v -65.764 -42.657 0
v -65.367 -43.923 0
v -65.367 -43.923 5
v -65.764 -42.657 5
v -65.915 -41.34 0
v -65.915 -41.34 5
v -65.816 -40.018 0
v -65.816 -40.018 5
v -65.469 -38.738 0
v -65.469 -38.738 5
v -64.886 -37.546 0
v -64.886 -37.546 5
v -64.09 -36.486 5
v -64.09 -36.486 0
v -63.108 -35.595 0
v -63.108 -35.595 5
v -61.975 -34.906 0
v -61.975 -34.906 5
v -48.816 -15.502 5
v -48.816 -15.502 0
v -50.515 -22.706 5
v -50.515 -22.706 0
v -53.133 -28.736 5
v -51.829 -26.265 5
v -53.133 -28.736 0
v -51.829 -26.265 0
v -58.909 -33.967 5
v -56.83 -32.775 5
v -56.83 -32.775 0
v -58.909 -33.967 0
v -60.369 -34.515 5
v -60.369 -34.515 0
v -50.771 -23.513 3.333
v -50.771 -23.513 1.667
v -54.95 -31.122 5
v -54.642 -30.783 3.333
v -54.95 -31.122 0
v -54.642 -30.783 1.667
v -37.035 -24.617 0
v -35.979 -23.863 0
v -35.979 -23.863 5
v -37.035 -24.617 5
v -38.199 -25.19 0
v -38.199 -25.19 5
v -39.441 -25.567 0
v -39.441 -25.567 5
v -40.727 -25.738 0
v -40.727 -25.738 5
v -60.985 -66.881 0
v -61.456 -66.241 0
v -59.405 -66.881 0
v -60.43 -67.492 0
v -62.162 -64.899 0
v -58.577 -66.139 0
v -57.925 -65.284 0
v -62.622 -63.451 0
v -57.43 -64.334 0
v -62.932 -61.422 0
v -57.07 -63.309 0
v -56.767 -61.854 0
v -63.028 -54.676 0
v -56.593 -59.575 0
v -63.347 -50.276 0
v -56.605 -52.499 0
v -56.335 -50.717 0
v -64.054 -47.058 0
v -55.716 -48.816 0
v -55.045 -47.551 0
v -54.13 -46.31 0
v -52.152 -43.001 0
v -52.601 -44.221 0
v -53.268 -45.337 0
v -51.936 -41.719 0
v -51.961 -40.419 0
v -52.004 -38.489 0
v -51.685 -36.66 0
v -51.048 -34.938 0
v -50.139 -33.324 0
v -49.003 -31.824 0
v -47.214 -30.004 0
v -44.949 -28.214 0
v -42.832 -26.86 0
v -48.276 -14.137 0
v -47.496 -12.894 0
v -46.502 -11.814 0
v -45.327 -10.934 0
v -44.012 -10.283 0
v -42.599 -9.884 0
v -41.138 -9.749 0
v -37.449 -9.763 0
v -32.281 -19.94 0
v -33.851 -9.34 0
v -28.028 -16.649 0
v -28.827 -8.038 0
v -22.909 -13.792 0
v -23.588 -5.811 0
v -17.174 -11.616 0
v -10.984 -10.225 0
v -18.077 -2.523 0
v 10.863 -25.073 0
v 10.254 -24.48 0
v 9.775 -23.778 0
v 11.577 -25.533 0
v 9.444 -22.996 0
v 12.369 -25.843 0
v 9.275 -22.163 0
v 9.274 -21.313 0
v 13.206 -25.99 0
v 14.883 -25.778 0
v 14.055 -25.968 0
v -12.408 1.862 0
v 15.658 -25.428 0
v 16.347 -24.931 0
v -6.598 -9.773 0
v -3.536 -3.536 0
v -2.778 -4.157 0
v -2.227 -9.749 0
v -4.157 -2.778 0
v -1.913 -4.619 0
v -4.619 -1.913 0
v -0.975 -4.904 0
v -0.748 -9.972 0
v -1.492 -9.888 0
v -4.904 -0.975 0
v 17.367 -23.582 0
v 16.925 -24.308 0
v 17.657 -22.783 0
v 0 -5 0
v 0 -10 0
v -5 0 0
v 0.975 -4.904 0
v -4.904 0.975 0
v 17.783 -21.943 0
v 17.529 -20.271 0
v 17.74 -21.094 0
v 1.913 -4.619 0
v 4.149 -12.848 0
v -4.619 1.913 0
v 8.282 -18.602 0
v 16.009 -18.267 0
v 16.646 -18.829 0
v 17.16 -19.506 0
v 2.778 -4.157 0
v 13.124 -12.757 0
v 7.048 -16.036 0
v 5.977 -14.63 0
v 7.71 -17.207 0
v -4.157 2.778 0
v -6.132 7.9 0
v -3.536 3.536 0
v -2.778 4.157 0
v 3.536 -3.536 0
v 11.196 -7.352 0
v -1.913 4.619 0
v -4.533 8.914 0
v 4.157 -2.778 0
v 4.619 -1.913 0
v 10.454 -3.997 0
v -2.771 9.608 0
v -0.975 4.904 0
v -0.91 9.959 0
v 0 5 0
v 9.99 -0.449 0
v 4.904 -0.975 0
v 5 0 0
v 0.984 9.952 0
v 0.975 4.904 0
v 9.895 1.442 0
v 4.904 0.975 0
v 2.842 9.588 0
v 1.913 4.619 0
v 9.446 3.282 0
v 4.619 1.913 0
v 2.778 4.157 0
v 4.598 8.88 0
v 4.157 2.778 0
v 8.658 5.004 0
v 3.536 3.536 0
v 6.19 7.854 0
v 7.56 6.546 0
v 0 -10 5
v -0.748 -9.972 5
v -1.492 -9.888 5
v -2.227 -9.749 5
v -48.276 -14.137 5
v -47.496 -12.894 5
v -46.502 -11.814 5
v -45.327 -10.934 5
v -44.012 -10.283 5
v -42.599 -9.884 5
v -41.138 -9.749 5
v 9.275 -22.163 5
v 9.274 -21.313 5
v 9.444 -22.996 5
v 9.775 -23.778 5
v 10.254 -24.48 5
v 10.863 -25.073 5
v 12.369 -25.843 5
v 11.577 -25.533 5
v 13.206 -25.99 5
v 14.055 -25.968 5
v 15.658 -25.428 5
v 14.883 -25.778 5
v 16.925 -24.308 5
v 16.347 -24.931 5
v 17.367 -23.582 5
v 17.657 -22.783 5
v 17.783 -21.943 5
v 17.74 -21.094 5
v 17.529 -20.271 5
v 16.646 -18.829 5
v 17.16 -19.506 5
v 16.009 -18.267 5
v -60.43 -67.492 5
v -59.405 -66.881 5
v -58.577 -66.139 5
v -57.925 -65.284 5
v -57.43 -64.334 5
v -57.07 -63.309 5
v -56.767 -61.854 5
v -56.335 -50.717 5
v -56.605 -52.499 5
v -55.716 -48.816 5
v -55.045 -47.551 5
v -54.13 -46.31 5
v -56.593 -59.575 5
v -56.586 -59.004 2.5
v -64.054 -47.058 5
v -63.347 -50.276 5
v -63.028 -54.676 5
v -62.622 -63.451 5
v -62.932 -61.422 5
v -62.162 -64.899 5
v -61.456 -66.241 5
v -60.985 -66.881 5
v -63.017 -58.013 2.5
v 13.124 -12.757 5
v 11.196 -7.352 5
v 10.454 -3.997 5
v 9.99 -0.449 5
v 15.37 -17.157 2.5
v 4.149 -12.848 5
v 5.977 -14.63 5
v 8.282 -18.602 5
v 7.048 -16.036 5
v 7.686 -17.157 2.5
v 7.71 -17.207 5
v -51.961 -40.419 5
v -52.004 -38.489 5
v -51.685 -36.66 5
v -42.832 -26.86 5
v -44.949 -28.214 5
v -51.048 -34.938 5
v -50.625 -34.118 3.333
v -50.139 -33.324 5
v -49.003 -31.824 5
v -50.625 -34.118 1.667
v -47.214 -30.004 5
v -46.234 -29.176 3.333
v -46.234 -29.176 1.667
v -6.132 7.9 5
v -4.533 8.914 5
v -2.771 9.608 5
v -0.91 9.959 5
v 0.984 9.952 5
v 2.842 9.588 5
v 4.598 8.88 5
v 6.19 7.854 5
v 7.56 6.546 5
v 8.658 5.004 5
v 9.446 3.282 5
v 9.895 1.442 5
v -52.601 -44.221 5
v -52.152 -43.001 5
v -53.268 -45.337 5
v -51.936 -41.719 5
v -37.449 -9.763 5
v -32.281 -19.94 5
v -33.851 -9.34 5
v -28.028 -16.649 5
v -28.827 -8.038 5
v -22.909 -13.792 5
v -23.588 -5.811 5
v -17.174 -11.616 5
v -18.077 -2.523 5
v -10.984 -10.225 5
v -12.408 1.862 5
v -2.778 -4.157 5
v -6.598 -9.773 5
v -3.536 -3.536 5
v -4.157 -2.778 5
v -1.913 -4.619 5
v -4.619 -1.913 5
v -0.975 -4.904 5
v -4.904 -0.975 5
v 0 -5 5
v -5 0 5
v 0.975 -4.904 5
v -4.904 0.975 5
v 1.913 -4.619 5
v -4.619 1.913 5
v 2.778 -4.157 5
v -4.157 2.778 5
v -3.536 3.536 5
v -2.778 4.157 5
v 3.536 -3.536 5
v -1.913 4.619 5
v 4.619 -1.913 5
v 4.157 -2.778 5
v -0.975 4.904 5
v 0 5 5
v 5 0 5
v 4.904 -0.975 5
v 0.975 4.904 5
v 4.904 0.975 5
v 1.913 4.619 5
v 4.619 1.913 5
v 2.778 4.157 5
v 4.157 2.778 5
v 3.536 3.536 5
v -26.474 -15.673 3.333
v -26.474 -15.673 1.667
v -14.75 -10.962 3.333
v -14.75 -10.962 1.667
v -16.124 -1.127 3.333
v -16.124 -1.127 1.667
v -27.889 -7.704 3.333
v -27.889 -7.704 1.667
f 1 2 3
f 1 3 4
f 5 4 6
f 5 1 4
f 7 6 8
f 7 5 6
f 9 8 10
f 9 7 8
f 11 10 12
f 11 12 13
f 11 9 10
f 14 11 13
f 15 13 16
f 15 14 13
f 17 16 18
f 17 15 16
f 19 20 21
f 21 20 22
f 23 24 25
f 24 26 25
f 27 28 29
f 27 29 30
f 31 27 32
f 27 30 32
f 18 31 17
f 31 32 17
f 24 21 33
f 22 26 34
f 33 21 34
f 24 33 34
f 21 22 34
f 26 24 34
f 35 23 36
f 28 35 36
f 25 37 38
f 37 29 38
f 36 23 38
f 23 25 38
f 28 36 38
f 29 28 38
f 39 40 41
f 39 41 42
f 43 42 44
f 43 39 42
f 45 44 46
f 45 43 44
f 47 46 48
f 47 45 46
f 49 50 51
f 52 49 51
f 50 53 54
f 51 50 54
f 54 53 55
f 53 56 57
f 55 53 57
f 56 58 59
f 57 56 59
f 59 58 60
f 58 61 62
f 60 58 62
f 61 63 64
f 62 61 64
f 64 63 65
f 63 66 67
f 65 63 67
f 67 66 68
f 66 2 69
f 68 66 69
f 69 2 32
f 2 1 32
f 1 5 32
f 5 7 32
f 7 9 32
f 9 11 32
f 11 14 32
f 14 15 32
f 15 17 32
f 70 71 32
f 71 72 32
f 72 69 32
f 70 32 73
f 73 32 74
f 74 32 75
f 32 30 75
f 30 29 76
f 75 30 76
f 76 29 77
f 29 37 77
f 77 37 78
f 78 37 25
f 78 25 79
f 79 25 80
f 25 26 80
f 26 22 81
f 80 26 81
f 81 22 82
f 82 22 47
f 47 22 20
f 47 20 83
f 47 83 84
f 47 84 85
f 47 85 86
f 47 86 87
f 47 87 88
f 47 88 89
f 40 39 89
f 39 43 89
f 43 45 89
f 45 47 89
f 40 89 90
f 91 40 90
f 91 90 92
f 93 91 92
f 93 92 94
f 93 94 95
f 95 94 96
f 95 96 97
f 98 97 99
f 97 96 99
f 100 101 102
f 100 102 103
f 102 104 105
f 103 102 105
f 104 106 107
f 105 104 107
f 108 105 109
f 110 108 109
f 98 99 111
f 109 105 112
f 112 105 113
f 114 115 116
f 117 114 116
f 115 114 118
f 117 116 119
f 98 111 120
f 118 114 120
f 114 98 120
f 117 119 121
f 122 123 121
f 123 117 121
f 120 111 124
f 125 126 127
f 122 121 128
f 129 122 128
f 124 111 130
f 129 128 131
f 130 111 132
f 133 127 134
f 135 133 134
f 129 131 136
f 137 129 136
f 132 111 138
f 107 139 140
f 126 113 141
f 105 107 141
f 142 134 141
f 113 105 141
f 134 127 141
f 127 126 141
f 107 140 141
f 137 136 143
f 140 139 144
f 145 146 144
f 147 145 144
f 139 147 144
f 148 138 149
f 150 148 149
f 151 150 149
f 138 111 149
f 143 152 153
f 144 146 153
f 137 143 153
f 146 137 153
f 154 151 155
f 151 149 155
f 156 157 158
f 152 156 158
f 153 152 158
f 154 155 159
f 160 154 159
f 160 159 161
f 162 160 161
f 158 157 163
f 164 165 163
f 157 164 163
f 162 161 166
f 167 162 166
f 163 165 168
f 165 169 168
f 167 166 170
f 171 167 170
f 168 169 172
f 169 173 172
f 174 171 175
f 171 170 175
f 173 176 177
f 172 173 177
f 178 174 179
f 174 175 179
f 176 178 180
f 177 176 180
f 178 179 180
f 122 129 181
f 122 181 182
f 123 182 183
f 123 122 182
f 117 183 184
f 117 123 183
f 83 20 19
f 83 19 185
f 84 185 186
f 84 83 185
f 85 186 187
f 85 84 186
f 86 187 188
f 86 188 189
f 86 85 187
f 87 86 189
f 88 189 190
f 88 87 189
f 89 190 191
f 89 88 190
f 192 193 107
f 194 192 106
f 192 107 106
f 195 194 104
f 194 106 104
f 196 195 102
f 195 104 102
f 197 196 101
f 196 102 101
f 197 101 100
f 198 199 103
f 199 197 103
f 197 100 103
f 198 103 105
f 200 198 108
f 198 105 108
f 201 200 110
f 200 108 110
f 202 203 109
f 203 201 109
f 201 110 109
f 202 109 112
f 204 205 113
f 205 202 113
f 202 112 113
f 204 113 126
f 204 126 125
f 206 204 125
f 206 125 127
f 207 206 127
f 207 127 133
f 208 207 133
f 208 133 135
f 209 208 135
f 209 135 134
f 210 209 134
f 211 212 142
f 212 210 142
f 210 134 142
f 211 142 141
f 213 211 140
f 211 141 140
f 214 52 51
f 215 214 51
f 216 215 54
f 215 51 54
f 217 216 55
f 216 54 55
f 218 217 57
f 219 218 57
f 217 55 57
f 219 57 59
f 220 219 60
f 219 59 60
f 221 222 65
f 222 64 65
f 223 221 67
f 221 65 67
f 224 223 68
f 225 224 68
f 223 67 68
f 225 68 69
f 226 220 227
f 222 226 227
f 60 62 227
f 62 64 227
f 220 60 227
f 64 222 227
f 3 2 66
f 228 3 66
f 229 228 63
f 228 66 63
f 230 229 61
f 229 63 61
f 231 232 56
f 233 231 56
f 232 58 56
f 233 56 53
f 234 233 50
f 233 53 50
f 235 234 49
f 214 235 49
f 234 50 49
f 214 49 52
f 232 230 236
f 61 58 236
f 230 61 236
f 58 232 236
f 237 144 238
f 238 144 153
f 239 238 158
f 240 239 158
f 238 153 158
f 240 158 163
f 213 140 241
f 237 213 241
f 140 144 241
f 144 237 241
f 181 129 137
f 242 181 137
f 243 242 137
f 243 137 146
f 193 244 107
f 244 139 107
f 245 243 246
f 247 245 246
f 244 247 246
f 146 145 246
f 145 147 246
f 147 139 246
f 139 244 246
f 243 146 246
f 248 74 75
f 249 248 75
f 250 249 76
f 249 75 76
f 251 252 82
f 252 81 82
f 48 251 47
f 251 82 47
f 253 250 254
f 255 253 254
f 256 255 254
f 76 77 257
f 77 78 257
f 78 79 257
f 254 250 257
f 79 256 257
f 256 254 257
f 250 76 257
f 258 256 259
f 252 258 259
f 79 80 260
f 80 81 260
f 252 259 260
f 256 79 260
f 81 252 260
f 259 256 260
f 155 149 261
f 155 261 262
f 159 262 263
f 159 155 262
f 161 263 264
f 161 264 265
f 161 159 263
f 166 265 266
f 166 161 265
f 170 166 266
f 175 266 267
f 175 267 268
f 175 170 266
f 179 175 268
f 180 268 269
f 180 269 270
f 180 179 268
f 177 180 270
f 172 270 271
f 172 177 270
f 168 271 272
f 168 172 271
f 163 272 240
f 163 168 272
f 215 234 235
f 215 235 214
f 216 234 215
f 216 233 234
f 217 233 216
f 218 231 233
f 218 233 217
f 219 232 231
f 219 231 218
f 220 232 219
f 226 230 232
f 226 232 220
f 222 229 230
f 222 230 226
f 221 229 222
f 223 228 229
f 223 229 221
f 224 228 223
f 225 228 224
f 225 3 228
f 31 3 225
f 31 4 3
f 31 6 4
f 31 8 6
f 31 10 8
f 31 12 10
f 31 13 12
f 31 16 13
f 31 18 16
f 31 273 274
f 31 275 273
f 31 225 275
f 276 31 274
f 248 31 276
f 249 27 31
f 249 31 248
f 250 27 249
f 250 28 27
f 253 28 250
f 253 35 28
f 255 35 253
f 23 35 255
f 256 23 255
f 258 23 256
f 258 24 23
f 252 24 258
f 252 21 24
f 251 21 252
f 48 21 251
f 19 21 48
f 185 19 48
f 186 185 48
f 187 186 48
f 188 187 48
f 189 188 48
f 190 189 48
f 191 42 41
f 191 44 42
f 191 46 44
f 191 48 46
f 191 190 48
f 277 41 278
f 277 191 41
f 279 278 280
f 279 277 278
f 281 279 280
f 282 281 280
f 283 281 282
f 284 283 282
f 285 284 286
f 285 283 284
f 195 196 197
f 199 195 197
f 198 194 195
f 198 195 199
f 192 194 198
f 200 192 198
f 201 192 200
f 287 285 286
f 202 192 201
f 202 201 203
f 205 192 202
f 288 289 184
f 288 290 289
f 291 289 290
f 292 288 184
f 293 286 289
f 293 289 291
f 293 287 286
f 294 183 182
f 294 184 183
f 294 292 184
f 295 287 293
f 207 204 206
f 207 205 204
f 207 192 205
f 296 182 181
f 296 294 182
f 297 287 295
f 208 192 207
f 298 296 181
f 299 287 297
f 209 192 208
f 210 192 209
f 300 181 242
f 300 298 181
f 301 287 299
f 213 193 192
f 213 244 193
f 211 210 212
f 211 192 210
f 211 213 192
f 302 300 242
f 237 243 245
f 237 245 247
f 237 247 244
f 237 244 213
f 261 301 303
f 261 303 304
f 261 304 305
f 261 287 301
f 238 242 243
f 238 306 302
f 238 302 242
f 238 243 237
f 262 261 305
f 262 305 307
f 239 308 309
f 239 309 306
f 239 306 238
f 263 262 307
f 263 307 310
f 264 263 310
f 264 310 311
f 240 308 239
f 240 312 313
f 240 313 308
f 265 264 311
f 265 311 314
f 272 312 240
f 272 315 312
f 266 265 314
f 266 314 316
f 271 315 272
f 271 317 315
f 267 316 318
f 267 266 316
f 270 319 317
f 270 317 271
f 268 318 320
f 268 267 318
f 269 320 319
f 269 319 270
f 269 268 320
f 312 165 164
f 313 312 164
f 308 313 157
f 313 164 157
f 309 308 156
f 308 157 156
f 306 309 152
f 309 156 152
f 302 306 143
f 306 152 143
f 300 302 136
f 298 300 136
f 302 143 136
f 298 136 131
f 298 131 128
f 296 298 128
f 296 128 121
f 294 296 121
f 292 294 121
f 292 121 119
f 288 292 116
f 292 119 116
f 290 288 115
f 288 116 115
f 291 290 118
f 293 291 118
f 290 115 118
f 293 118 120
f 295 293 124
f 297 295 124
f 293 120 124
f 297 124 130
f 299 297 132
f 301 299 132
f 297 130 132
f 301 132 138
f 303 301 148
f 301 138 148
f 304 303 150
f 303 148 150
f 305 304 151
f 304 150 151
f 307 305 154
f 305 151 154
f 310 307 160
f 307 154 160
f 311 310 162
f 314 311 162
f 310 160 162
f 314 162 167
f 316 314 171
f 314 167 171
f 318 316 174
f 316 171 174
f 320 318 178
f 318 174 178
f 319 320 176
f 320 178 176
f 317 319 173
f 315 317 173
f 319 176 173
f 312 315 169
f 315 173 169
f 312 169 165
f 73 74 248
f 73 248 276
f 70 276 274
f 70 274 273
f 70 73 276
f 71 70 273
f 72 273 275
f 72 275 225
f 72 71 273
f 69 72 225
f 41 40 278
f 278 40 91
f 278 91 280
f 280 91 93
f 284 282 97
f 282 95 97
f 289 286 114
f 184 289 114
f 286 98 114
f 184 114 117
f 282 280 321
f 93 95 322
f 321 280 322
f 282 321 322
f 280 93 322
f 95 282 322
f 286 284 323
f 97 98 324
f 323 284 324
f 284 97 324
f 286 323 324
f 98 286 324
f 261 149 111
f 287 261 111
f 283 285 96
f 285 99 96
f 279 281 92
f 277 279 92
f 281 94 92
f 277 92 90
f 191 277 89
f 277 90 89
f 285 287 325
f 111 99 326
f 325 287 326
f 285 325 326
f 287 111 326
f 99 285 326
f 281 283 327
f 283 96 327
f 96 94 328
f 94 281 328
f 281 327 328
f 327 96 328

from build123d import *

# Parameters (mm, degrees)
CROQUIS1_R              = 5.000000002
SALIENTE_EXTRUIR1_DEPTH = 5
SALIENTE_EXTRUIR2_START = -5
CROQUIS2_R              = 4.26743785
SALIENTE_EXTRUIR2_DEPTH = 5


with BuildPart() as part:
    # Croquis1 → Saliente-Extruir1 (new body)
    with BuildSketch(Plane(origin=(0, 0, 0), x_dir=(-1, 0, 0), z_dir=(0, 0, -1))):
        with BuildLine():
            ThreePointArc((65.366552273, -43.922636472), (65.468760949, -38.737894565), (61.975170701, -34.905555535))
            add(Edge.make_bspline(
                [(48.815695063, -15.501711479), (50.328955685, -23.082906451), (52.395963263, -33.157522067), (61.975170701, -34.905555535)],
                knots=[0, 0, 0, 0, 1, 1, 1, 1], degree=3))
            ThreePointArc((48.815695063, -15.501711479), (45.934799024, -11.346655018), (41.137795802, -9.748901511))
            add(Edge.make_bspline(
                [(6.131666021, 7.899536167), (15.139972032, -1.656202419), (27.24511665, -10.665918482), (41.137795802, -9.748901511)],
                knots=[0, 0, 0, 0, 1, 1, 1, 1], degree=3))
            ThreePointArc((6.131666021, 7.899536167), (-4.598441285, 8.879996497), (-9.989918973, -0.448908775))
            add(Edge.make_bspline(
                [(-16.008618179, -18.26686517), (-15.797694107, -17.895825564), (-12.262638843, -11.871150313), (-10.546593735, -6.581162345), (-9.989918973, -0.448908775)],
                knots=[0, 0, 0, 0, 0.04039471, 0.656610986, 0.656610986, 0.656610986, 0.656610986], degree=3))
            ThreePointArc((-16.008618179, -18.26686517), (-11.761967136, -17.845761098), (-9.273993033, -21.312944188))
            add(Edge.make_bspline(
                [(-9e-09, -10.000000002), (-2.926729974, -11.686757621), (-7.513439547, -15.000663628), (-8.673577005, -19.940680978), (-9.273993033, -21.312944188)],
                knots=[0, 0, 0, 0, 0.464305351, 0.659664826, 0.659664826, 0.659664826, 0.659664826], degree=3))
            ThreePointArc((-9e-09, -10.000000002), (1.120487591, -9.937027099), (2.22686312, -9.748901509))
            add(Edge.make_bspline(
                [(35.978828296, -23.863233377), (28.058119493, -13.940958986), (14.675184196, -9.205569704), (2.22686312, -9.748901509)],
                knots=[0, 0, 0, 0, 1, 1, 1, 1], degree=3))
            ThreePointArc((35.978828296, -23.863233377), (38.199491242, -25.189759407), (40.727345447, -25.738365226))
            add(Edge.make_bspline(
                [(51.96076037, -40.419223819), (52.800264101, -33.487834784), (46.144416797, -28.374213166), (40.727345447, -25.738365226)],
                knots=[0, 0, 0, 0, 1, 1, 1, 1], degree=3))
            ThreePointArc((51.96076037, -40.419223819), (52.348210074, -43.621422867), (54.130381087, -46.309928491))
            add(Edge.make_bspline(
                [(60.429953363, -67.492405783), (57.103333259, -65.904114864), (55.916753892, -57.608938241), (57.449959784, -50.201518935), (54.130381087, -46.309928491)],
                knots=[0, 0, 0, 0, 0.425583063, 1, 1, 1, 1], degree=3))
            add(Edge.make_bspline(
                [(65.366552273, -43.922636472), (62.948824726, -48.37679887), (63.028170153, -56.438278724), (63.035847799, -64.90708051), (60.429953363, -67.492405783)],
                knots=[0, 0, 0, 0, 0.588886368, 1, 1, 1, 1], degree=3))
        make_face()
        with Locations(Location((-9e-09, -2e-09, 0), (0, 0, 180))):
            Circle(CROQUIS1_R, mode=Mode.SUBTRACT)
    extrude(amount=-SALIENTE_EXTRUIR1_DEPTH)

    # Croquis2 → Saliente-Extruir2 (add)
    with BuildSketch(Plane.XY.offset(5).offset(SALIENTE_EXTRUIR2_START)):
        with Locations((13.520610478, -21.733973978)):
            Circle(CROQUIS2_R)
    extrude(amount=SALIENTE_EXTRUIR2_DEPTH)


solid = part.part
